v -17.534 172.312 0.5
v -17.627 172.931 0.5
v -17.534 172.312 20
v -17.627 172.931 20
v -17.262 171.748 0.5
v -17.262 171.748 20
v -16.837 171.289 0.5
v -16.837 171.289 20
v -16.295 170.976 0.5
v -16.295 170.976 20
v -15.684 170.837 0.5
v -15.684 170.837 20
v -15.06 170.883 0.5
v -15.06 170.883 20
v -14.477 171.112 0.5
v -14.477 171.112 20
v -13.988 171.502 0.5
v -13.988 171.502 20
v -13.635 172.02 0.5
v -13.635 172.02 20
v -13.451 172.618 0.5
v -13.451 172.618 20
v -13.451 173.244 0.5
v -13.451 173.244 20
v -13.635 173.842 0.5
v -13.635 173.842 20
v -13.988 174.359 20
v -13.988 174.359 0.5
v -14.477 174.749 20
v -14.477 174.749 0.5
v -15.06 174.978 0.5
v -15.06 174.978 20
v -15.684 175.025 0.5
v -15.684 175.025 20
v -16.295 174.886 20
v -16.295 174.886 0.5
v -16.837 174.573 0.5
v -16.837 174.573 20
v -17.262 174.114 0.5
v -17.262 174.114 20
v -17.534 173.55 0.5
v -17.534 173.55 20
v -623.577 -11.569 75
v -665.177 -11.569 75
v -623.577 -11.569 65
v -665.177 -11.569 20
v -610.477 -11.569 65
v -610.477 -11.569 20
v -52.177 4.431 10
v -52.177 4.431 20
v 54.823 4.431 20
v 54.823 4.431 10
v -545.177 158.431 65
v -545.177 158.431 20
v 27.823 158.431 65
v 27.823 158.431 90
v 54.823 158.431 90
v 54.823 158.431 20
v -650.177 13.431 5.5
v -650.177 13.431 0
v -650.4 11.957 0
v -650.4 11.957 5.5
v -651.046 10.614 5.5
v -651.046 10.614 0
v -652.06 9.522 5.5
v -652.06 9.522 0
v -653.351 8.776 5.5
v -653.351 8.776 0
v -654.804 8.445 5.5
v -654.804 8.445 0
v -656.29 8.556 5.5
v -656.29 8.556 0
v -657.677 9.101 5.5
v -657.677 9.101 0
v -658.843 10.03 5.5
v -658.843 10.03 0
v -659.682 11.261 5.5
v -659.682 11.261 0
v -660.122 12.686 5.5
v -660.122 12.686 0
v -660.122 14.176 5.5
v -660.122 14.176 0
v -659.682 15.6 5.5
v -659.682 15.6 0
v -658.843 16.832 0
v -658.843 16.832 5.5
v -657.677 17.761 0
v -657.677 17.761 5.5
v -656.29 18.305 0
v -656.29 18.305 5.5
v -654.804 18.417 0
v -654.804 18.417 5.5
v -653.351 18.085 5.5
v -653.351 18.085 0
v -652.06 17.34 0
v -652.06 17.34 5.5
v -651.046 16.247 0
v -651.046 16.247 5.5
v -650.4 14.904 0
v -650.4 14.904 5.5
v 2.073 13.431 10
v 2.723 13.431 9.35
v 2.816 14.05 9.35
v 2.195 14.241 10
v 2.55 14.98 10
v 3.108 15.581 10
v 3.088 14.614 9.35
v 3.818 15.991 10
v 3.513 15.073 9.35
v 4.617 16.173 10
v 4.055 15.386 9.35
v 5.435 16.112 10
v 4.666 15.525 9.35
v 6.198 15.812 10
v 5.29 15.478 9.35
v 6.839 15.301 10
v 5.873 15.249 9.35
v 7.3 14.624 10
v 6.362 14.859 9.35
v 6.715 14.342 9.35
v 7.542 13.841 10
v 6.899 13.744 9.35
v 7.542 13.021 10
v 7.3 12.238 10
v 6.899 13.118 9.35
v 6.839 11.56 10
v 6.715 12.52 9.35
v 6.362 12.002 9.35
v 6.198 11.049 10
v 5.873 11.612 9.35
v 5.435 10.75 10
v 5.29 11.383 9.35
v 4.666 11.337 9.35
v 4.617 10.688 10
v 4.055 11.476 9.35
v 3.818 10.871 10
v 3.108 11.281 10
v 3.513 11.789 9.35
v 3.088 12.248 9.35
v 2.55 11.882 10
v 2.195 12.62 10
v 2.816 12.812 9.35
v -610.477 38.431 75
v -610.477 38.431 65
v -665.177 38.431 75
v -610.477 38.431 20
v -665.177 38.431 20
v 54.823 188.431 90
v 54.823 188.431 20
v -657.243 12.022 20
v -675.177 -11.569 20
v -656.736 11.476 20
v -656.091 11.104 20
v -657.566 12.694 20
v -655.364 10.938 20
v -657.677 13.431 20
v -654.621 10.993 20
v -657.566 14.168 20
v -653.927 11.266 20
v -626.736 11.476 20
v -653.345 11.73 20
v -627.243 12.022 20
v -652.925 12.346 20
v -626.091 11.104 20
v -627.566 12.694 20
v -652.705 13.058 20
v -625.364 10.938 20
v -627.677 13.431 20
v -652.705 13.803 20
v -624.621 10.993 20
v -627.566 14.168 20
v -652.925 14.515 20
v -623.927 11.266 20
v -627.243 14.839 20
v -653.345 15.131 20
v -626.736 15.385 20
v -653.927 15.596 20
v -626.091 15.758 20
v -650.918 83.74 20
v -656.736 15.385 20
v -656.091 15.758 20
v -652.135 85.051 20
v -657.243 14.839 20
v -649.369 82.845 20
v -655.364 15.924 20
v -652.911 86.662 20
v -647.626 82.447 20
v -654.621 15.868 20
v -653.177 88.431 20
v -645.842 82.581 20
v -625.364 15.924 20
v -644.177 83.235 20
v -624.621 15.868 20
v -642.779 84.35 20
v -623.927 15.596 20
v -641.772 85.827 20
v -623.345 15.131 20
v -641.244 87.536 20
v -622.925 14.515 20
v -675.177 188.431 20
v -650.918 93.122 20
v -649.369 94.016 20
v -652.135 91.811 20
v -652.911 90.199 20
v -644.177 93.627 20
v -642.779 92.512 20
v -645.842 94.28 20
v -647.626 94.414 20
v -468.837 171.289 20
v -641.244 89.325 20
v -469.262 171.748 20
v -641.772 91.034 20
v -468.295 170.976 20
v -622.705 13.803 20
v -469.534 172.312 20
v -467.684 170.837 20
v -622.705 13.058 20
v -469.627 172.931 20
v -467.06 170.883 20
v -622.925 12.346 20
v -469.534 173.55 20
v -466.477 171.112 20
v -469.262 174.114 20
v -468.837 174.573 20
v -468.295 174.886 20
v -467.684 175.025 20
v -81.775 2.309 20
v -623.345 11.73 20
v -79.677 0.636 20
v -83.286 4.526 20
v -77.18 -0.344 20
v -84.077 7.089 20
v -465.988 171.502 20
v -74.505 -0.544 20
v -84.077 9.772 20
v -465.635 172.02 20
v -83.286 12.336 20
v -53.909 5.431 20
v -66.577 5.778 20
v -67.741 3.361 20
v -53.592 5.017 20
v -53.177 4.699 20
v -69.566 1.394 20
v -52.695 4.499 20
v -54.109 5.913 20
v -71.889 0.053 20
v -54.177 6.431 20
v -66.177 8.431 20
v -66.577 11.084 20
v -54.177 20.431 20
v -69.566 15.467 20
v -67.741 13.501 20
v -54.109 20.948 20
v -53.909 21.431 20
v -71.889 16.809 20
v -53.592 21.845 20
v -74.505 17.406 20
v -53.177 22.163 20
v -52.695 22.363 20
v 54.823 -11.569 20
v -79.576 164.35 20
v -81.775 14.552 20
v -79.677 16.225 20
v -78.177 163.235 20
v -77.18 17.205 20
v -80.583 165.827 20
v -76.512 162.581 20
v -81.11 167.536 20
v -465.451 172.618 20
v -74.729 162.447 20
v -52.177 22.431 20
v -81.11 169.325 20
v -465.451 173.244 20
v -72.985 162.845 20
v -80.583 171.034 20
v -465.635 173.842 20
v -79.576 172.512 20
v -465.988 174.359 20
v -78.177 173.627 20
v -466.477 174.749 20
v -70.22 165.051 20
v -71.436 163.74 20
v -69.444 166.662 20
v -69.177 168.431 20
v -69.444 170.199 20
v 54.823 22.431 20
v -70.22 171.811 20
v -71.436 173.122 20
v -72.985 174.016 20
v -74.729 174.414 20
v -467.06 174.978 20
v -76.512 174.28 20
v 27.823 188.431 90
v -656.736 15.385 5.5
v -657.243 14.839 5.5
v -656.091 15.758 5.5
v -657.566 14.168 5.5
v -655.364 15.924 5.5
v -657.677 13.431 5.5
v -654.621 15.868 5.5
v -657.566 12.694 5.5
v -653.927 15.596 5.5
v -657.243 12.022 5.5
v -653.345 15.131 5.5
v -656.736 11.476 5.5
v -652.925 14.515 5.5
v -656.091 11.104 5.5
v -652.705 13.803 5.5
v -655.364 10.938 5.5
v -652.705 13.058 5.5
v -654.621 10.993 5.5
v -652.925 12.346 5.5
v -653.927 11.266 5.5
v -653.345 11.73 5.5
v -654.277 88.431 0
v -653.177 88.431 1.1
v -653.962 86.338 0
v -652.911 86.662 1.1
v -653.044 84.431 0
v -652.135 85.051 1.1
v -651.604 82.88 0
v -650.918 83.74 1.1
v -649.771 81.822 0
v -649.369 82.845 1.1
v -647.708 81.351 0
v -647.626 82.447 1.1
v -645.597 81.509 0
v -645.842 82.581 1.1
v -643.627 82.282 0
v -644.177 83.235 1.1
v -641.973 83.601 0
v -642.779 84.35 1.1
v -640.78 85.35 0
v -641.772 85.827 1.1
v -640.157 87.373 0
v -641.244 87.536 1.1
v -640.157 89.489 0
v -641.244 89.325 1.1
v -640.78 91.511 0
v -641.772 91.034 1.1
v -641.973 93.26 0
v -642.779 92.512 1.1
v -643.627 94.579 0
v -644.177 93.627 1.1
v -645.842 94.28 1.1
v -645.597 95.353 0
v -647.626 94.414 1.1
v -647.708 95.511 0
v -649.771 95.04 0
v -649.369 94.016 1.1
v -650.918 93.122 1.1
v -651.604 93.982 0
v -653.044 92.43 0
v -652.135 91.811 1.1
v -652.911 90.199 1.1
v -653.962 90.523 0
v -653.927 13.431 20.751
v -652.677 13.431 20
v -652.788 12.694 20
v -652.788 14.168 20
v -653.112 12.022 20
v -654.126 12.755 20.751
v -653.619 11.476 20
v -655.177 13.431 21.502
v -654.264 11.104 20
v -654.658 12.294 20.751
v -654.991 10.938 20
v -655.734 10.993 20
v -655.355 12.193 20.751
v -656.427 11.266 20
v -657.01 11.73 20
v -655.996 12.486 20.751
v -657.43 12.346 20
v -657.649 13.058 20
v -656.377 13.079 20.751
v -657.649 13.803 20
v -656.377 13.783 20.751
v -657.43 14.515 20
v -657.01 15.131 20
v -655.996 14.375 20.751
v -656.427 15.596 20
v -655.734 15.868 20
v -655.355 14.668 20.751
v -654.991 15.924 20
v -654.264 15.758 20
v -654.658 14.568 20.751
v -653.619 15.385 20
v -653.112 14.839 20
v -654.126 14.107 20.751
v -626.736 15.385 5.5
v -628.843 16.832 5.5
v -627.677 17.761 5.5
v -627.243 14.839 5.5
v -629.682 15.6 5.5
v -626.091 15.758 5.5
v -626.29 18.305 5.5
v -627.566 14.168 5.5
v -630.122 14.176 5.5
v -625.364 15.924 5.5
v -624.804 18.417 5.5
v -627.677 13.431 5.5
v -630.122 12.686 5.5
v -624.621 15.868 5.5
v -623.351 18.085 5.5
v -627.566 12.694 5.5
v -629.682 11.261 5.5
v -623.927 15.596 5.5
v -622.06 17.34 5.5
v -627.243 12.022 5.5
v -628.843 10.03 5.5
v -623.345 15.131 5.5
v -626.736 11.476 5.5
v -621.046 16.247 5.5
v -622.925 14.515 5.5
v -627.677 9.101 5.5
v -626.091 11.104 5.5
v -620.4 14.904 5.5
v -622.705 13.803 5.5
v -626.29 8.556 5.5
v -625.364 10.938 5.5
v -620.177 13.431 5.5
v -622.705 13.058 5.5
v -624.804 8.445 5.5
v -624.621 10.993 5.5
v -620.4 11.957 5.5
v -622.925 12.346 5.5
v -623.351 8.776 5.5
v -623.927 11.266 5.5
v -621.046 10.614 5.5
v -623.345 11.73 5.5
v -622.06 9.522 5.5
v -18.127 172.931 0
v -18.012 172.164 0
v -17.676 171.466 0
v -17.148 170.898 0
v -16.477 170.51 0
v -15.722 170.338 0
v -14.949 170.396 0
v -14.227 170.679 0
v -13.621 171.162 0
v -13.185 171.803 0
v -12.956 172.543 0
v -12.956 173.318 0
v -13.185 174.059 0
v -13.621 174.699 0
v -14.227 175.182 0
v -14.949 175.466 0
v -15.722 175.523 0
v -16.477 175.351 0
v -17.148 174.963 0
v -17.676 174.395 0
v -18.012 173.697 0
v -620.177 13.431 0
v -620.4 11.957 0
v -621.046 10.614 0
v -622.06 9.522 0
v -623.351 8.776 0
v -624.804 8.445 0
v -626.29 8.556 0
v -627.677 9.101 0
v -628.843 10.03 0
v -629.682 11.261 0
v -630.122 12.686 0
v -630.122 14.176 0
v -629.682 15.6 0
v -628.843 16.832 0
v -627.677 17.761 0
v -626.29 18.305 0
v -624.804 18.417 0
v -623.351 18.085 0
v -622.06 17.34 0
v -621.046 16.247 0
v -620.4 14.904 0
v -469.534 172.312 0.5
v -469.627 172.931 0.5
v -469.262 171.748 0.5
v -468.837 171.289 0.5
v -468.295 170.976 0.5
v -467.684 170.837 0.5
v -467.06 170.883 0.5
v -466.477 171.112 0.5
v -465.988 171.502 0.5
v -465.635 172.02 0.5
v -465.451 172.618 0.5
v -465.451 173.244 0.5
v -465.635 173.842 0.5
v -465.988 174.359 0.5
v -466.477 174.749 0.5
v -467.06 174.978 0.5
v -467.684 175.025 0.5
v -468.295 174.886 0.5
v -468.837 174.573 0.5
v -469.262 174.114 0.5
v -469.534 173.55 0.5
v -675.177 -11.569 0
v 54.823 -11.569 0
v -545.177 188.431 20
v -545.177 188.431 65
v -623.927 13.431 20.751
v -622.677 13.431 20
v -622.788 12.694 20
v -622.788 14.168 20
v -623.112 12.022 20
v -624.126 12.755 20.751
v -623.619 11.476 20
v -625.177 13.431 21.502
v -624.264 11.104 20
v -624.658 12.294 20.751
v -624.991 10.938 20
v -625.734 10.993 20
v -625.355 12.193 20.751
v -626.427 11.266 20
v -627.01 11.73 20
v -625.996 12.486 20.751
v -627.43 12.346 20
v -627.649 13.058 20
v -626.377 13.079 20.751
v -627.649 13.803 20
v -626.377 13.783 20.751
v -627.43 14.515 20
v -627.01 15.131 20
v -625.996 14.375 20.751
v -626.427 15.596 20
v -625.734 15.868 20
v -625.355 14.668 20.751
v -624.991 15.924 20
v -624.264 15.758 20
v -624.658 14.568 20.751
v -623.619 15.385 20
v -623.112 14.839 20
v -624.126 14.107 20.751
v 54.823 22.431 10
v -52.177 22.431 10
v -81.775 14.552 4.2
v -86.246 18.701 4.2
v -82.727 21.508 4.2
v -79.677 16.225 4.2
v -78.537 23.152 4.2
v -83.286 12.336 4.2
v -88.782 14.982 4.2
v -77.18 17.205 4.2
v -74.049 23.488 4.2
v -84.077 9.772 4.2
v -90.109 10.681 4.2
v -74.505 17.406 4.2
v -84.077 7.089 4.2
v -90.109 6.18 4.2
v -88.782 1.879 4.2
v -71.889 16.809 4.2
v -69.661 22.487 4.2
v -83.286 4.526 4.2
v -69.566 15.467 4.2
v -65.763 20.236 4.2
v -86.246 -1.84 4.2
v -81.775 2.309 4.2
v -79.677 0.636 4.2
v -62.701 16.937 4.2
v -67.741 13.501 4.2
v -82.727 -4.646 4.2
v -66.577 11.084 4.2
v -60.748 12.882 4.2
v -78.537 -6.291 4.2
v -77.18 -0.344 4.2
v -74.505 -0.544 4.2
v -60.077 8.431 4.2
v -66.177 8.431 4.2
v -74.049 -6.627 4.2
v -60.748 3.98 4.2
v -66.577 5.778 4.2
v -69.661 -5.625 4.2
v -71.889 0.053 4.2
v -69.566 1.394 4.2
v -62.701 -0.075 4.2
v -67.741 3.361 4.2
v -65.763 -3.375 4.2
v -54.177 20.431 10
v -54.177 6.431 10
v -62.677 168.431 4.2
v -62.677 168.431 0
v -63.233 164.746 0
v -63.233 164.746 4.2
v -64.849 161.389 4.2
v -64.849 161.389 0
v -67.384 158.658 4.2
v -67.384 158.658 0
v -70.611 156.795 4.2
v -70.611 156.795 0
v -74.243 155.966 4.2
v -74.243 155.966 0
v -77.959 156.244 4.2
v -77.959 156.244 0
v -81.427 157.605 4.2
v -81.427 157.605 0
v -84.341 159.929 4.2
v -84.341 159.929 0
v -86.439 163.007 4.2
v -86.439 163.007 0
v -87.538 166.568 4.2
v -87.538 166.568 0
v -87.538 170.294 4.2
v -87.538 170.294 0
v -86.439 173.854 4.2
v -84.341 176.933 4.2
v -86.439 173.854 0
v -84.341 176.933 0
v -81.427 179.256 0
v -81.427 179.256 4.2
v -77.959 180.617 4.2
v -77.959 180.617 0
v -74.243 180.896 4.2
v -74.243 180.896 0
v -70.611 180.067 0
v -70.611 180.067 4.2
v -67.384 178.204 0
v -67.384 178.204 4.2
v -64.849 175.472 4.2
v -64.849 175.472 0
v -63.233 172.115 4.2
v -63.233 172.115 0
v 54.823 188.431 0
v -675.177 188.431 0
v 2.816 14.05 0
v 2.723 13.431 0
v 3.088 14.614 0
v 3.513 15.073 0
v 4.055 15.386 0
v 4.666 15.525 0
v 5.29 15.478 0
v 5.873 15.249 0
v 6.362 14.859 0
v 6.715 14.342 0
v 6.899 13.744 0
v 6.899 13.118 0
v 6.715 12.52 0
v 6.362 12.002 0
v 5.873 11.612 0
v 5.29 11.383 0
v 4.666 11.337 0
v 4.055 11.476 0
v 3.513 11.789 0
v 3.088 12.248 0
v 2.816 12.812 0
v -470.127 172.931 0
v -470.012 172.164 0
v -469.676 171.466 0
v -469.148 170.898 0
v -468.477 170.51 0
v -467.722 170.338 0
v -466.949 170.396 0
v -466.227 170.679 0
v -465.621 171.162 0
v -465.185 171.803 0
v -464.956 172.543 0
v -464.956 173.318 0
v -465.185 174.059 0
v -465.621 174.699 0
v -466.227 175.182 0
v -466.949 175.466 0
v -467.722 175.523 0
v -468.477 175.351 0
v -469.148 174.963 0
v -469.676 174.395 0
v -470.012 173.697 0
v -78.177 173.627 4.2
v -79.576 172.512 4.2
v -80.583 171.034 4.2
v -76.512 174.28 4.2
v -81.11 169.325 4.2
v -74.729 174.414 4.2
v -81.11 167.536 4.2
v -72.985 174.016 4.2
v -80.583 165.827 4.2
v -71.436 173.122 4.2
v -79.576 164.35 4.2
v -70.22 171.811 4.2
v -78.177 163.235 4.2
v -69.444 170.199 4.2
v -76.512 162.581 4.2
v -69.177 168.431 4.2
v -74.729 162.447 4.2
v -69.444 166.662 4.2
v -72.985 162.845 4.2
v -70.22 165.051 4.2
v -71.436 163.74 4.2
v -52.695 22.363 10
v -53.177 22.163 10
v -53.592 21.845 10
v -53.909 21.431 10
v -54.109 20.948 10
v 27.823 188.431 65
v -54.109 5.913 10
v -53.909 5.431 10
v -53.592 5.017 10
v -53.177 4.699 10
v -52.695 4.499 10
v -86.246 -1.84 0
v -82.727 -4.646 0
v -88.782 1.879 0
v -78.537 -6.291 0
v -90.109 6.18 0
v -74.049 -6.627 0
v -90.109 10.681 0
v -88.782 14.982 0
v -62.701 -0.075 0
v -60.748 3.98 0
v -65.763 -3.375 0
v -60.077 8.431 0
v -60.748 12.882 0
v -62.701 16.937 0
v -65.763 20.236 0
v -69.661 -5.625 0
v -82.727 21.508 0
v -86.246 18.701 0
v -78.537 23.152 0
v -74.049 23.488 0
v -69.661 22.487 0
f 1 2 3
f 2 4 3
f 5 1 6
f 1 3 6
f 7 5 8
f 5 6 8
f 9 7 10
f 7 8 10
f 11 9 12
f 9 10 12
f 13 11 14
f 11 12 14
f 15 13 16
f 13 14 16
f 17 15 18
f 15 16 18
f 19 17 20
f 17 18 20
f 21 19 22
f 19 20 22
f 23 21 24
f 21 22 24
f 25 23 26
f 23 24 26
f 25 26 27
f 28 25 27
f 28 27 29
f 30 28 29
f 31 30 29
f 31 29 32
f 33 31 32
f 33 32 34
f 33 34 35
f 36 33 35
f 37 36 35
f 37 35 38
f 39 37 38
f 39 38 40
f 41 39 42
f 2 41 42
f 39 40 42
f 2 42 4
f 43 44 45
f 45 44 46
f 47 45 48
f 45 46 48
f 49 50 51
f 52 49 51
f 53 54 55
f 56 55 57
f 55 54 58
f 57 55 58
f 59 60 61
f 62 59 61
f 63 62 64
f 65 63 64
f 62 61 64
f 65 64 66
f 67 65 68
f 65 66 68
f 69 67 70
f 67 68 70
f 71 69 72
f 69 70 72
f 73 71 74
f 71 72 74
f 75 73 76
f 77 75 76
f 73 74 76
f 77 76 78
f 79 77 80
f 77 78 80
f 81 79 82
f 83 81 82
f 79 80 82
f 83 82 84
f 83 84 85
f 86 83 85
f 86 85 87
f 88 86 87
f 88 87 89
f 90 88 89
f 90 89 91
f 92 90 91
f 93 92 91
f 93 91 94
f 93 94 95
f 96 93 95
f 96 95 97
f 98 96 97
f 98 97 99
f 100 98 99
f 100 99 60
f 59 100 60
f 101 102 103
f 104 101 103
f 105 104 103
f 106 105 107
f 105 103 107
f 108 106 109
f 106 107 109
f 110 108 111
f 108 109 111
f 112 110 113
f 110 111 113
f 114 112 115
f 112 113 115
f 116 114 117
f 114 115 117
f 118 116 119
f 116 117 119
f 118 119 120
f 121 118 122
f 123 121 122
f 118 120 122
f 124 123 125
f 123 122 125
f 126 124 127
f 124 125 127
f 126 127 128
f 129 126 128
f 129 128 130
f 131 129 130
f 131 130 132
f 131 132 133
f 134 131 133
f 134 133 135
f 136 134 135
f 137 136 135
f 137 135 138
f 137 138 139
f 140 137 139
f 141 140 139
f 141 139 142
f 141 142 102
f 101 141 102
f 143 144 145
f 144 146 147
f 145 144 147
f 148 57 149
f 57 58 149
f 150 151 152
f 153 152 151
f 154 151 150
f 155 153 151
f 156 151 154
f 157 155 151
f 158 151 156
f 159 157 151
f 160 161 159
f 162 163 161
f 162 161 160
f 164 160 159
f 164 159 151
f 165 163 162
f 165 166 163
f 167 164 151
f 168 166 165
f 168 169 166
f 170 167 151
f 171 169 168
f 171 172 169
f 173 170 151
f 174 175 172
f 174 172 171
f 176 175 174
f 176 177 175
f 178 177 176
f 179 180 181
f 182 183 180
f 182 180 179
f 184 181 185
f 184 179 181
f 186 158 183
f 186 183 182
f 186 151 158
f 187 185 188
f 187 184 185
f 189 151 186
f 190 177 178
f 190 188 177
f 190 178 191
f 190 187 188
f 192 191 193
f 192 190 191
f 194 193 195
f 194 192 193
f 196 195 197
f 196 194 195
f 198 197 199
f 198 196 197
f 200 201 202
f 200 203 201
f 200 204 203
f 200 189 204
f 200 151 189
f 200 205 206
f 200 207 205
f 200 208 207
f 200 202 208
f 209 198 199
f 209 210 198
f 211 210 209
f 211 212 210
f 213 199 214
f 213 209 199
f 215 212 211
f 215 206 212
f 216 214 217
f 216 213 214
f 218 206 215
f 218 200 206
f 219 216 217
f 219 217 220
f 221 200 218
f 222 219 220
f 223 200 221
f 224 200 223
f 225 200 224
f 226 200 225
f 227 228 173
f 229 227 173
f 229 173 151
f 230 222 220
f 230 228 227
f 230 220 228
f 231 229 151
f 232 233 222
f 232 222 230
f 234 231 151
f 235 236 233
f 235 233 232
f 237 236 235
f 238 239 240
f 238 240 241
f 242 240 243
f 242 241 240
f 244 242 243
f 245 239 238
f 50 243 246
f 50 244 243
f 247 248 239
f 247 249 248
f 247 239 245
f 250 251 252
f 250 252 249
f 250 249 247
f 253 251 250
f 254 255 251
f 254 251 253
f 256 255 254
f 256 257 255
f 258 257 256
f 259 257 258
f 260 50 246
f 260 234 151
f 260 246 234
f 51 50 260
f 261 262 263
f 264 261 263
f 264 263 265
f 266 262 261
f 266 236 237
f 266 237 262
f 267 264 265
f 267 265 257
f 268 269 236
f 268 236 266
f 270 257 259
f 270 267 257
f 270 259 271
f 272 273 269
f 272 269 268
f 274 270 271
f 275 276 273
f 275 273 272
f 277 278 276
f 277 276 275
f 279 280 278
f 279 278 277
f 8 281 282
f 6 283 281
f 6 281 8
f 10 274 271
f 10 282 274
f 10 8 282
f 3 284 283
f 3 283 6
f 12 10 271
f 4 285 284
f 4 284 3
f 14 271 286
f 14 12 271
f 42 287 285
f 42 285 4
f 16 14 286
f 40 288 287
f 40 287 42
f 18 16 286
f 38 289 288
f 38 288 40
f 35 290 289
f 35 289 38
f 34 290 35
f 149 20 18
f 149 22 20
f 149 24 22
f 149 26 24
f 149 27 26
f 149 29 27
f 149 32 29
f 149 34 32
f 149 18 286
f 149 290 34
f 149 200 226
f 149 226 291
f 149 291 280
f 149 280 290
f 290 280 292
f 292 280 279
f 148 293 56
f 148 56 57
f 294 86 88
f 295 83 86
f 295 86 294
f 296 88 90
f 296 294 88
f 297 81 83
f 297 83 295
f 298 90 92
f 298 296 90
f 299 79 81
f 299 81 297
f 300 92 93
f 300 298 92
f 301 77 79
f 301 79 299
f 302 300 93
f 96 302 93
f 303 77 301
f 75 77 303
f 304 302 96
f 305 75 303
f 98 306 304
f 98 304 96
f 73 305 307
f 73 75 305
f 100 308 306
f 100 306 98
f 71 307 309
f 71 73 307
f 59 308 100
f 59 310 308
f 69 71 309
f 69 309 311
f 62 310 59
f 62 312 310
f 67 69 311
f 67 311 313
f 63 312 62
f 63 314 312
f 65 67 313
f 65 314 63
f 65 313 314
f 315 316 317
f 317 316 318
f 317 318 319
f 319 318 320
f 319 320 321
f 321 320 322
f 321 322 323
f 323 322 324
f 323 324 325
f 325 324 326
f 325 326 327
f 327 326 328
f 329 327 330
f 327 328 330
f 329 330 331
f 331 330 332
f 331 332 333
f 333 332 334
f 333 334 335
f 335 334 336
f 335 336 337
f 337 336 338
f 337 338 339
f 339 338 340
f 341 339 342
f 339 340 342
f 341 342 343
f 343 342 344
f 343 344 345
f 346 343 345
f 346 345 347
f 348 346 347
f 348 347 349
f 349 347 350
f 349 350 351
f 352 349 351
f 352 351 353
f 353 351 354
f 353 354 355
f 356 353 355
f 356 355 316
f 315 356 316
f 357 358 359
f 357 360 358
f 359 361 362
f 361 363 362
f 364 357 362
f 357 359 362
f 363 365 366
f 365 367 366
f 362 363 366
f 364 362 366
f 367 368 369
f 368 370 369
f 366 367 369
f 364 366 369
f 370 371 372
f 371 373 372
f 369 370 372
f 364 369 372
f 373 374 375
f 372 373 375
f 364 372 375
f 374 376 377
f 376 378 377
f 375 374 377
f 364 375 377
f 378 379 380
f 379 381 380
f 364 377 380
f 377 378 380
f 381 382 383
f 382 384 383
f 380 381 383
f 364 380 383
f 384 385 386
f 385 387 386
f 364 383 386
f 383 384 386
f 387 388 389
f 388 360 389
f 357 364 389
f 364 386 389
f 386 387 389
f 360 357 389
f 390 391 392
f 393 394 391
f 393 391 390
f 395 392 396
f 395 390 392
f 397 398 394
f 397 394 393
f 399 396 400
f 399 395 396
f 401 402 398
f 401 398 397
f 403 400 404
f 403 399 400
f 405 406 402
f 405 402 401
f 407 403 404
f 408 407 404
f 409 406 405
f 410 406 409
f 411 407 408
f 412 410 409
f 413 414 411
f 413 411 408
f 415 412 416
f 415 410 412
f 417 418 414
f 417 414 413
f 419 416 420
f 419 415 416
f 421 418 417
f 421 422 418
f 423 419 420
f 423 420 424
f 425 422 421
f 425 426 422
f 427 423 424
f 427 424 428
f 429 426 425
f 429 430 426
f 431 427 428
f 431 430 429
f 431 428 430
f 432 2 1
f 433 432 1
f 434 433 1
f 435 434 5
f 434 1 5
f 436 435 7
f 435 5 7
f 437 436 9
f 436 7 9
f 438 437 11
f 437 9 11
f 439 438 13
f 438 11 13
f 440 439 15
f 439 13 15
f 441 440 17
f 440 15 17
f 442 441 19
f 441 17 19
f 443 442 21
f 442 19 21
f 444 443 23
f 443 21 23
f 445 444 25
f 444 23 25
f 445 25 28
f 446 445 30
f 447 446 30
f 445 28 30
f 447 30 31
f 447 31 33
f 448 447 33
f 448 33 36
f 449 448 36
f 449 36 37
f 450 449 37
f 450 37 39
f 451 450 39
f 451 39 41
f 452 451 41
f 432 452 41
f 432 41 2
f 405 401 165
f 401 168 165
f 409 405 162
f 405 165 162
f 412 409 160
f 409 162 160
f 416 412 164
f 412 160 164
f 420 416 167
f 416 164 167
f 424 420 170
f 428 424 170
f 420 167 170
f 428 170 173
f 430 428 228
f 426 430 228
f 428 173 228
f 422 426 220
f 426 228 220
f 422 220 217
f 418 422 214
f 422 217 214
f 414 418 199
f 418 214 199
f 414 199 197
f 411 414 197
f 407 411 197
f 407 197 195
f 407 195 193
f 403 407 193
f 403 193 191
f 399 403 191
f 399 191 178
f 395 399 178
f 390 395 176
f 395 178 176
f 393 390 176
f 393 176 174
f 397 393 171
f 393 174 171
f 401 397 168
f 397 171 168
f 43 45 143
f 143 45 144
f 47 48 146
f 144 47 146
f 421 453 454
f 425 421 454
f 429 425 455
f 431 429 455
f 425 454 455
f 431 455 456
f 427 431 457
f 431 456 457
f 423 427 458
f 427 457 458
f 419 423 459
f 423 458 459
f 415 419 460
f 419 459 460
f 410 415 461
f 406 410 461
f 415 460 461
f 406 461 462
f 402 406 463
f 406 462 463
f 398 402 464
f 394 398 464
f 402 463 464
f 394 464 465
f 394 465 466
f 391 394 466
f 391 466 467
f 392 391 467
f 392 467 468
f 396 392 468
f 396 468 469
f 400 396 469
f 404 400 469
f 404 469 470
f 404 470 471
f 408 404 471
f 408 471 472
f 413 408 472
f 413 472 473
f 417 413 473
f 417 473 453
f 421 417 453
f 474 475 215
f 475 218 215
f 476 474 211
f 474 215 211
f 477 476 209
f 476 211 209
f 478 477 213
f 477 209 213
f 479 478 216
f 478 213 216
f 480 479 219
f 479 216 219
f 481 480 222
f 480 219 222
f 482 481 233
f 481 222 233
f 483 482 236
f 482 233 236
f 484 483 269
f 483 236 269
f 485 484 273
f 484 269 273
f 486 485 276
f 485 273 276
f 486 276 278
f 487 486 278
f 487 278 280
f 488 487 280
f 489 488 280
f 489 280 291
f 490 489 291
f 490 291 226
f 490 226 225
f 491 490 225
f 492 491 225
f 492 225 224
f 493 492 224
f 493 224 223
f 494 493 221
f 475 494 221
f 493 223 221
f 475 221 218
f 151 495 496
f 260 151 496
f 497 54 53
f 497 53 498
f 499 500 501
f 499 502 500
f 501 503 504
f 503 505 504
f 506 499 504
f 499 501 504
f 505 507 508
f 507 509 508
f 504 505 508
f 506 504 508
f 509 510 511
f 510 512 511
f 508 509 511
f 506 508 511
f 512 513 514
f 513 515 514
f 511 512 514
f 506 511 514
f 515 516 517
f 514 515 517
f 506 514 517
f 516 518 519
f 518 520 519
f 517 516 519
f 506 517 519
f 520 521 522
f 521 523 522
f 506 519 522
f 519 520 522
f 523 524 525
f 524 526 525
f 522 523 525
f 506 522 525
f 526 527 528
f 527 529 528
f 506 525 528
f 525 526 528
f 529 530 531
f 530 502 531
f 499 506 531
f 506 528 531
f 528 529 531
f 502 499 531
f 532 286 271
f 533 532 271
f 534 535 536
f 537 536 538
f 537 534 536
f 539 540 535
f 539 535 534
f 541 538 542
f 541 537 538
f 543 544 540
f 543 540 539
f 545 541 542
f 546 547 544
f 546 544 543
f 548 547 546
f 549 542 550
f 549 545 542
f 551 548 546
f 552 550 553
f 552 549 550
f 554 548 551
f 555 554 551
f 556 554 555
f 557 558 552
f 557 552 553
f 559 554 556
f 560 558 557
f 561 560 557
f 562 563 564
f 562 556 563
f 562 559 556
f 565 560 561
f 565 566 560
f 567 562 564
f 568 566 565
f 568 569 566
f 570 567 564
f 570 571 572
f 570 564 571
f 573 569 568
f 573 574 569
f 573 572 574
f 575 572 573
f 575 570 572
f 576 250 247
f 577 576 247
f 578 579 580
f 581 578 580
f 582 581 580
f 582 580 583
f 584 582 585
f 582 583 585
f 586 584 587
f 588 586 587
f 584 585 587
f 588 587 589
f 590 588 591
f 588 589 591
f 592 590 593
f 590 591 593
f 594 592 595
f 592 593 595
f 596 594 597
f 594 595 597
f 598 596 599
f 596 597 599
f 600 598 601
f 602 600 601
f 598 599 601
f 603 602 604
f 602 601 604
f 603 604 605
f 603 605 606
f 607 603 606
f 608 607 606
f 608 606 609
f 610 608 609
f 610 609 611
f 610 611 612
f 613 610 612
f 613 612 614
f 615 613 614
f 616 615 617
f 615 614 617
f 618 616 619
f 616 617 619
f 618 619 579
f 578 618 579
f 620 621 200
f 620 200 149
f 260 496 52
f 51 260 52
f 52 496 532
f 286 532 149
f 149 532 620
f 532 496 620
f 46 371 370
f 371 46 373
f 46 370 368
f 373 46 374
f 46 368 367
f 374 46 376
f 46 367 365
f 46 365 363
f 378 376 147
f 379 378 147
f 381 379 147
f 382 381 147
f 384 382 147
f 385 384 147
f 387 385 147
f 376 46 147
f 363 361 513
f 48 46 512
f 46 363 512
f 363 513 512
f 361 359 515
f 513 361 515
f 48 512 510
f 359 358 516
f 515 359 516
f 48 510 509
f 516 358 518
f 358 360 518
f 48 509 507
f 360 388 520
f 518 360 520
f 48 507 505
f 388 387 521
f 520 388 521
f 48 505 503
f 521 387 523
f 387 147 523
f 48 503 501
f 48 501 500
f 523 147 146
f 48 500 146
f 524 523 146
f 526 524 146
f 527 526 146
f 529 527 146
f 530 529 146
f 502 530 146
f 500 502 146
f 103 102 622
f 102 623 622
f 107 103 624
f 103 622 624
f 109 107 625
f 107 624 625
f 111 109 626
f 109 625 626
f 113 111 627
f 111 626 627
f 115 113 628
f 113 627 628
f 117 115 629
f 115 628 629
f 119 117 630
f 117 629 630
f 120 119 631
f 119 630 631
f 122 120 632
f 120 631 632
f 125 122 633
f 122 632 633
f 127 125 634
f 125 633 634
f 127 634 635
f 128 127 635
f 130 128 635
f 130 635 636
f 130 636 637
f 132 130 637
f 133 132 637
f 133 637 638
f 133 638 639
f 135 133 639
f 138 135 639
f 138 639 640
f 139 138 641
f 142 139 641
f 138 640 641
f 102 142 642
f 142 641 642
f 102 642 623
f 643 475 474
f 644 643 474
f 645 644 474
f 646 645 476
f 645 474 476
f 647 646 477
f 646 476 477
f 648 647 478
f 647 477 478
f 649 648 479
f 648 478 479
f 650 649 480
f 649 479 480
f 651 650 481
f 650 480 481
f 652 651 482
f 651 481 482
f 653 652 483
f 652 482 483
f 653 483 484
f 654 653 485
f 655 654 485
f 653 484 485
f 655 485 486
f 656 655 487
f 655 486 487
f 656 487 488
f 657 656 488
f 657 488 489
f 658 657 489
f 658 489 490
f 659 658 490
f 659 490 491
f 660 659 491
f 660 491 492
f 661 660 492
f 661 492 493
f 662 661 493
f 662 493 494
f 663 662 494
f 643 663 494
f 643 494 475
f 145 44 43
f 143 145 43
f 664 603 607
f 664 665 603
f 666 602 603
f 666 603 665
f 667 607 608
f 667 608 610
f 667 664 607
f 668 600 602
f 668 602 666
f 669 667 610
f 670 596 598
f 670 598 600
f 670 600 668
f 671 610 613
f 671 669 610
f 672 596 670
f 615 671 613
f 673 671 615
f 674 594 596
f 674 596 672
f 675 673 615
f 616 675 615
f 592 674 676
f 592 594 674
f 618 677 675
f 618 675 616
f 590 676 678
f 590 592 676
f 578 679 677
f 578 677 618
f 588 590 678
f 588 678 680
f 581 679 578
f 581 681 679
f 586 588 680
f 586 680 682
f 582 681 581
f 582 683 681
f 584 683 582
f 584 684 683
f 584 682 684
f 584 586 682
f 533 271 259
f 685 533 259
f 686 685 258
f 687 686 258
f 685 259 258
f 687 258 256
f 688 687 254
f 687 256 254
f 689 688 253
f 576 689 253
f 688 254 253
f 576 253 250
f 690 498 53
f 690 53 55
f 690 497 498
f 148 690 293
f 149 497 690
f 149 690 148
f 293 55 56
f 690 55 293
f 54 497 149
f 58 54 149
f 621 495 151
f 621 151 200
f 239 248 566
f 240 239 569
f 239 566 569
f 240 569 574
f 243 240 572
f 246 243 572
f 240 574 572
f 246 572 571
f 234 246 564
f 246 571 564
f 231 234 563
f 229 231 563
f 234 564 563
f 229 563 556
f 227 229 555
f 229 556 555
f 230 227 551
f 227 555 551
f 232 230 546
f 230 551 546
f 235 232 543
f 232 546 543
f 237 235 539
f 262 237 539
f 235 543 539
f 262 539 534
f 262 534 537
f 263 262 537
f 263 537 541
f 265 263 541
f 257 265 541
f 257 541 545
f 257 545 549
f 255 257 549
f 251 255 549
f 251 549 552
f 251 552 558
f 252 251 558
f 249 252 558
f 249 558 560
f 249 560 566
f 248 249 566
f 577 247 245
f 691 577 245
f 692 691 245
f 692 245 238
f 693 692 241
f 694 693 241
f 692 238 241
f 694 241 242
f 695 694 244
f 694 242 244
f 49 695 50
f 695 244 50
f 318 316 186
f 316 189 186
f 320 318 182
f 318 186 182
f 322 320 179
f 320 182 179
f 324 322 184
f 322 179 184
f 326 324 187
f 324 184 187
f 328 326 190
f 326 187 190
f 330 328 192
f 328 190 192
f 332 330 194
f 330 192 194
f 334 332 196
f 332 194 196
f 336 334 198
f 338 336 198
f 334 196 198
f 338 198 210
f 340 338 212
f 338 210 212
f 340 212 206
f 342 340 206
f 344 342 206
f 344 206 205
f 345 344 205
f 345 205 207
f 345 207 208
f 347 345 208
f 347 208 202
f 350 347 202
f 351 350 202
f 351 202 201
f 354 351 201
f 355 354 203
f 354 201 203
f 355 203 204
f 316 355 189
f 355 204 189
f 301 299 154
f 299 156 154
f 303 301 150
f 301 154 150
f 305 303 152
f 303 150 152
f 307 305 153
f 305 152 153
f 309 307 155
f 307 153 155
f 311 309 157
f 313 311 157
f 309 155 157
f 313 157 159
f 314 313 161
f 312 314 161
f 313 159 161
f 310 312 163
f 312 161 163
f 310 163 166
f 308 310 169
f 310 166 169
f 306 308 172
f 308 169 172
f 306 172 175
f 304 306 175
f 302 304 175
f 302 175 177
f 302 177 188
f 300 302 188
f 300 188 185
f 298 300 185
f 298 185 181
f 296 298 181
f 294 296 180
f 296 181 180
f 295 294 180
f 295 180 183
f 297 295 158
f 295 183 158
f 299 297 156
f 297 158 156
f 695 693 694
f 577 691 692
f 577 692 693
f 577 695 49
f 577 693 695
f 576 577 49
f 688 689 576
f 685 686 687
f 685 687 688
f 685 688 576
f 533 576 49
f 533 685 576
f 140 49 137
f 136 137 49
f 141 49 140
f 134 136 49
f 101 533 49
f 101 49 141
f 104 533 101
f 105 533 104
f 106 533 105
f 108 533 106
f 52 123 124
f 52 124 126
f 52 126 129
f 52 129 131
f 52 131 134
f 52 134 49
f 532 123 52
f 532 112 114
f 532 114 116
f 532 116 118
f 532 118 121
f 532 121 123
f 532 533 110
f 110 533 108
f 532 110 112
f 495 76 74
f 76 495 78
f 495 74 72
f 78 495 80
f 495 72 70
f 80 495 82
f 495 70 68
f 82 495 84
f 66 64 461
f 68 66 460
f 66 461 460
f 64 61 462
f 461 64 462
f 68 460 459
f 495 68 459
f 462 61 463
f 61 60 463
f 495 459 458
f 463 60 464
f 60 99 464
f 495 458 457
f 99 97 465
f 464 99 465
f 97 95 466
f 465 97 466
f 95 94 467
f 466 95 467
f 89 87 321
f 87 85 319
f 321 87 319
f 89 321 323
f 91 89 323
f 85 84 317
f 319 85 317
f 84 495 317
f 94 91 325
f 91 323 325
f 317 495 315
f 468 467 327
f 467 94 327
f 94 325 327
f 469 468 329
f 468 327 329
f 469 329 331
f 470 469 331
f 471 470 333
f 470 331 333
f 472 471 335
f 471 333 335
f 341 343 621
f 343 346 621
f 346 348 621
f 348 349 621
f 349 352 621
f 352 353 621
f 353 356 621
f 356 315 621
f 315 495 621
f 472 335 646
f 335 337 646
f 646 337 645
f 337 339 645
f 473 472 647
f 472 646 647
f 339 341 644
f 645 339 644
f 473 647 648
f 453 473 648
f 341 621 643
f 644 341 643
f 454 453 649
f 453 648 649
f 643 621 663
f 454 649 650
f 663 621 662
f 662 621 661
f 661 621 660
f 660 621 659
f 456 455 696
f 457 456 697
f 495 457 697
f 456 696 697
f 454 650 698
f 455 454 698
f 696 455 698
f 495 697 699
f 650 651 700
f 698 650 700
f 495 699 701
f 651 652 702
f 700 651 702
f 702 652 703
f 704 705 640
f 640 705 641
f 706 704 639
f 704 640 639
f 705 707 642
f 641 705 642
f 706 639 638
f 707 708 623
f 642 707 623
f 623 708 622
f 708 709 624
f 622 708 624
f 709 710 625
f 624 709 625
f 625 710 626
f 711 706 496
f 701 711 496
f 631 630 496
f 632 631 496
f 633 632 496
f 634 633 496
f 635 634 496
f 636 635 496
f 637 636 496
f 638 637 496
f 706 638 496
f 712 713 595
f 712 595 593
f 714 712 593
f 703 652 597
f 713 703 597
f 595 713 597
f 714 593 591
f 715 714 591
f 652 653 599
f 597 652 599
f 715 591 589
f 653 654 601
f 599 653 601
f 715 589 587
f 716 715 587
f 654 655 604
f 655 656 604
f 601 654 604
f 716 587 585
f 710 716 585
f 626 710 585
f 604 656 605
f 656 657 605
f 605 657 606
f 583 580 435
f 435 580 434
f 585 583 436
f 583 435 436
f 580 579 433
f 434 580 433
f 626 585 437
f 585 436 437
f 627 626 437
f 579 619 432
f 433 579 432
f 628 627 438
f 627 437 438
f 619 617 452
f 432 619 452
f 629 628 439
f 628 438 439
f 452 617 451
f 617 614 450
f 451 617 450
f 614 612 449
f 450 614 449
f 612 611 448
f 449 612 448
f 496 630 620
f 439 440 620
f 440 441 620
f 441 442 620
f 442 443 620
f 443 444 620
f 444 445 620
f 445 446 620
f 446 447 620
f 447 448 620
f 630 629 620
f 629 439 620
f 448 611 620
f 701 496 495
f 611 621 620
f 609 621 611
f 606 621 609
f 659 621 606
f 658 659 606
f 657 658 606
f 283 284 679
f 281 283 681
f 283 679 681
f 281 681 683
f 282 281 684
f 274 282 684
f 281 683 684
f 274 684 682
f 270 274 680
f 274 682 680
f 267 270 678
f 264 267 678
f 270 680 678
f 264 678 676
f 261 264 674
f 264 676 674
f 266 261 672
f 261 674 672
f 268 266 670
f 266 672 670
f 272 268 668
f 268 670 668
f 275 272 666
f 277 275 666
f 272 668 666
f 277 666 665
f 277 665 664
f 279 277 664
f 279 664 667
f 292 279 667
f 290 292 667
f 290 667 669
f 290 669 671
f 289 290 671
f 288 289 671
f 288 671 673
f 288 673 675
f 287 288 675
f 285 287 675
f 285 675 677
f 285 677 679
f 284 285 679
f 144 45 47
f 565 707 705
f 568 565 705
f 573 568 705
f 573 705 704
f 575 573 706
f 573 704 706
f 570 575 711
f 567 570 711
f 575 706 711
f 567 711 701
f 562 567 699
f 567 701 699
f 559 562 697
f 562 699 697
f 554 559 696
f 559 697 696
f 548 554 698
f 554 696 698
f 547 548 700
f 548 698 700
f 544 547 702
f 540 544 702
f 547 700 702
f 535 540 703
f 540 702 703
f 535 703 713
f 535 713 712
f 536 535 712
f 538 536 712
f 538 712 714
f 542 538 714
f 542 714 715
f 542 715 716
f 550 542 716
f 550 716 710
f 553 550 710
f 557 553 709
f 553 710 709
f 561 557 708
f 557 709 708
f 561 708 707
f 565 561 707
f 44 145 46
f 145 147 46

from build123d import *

# Parameters (mm, degrees)
F0_W              = 730
F0_H              = 200
F1_DEPTH          = 20
F2_W              = 600
F2_H              = 30
F3_DEPTH          = 45
F4_W              = 27
F4_H              = 30
F5_DEPTH          = 25
F6_W              = 54.7
F6_H              = 50
F7_DEPTH          = 45
F9_DEPTH          = 10
F11_DEPTH         = 10
F13_D             = 4.2
F13_CSINK_D       = 5.5
F13_CSINK_ANGLE   = 90
F15_D             = 4.2
F15_CSINK_D       = 5.2
F15_CSINK_ANGLE   = 90
F16_D             = 12
F16_CSINK_D       = 14.2
F16_CSINK_ANGLE   = 90
F17_D             = 5
F17_DEPTH         = 20
F17_CBORE_D       = 10
F17_CBORE_DEPTH   = 5.5
F17_TIP           = 1.5021515476
F17_2_D           = 5
F17_2_DEPTH       = 20
F17_2_CBORE_D     = 10
F17_2_CBORE_DEPTH = 5.5
F17_2_TIP         = 1.5021515476
F18_R             = 9
F18_R_2           = 6
F19_DEPTH         = 90.001
F20_R             = 15.1
F20_R_2           = 9
F20_R_3           = 12.5
F20_R_4           = 6
F21_DEPTH         = 4.2


with BuildPart() as f1:
    # F0 (on Top) → F1 (new body)
    with BuildSketch(Plane.XY):
        with Locations((-310.177372545, 88.43071796)):
            Rectangle(F0_W, F0_H)
    extrude(amount=F1_DEPTH)

    # F10 (on face) → F11 (cut)
    with BuildSketch(Plane.XY.offset(20)):
        with BuildLine():
            Line((54.822627455, 4.43071796), (54.822627455, 22.43071796))
            Line((54.822627455, 22.43071796), (-52.177372545, 22.43071796))
            ThreePointArc((-52.177372545, 22.43071796), (-53.5915861074, 21.8449315224), (-54.177372545, 20.43071796))
            Line((-54.177372545, 20.43071796), (-54.177372545, 6.43071796))
            ThreePointArc((-54.177372545, 6.43071796), (-53.5915861074, 5.0165043976), (-52.177372545, 4.43071796))
            Line((-52.177372545, 4.43071796), (54.822627455, 4.43071796))
        make_face()
    extrude(amount=-F11_DEPTH, mode=Mode.SUBTRACT)

    # F13 (through all)
    with Locations(Plane.XY.offset(10)):
        with Locations((4.822627455, 13.43071796)):
            CounterSinkHole(F13_D / 2, F13_CSINK_D / 2, counter_sink_angle=F13_CSINK_ANGLE)

    # F15 (through all)
    with Locations(Plane(origin=(0, 0, 0), x_dir=(1, 0, 0), z_dir=(0, 0, -1))):
        with Locations((-15.527372545, -172.93071796), (-467.527372545, -172.93071796)):
            CounterSinkHole(F15_D / 2, F15_CSINK_D / 2, counter_sink_angle=F15_CSINK_ANGLE)

    # F16 (through all)
    with Locations(Plane(origin=(0, 0, 0), x_dir=(1, 0, 0), z_dir=(0, 0, -1))):
        with Locations((-647.177372545, -88.43071796)):
            CounterSinkHole(F16_D / 2, F16_CSINK_D / 2, counter_sink_angle=F16_CSINK_ANGLE)

    # F17
    with Locations(Plane(origin=(0, 0, 0), x_dir=(1, 0, 0), z_dir=(0, 0, -1))):
        with Locations((-655.177372545, -13.43071796), (-625.177372545, -13.43071796)):
            CounterBoreHole(F17_D / 2, F17_CBORE_D / 2, F17_CBORE_DEPTH, depth=F17_DEPTH)
            with Locations((0, 0, -(F17_DEPTH + F17_TIP / 2))):  # 118° drill point
                Cone(0, F17_D / 2, F17_TIP, mode=Mode.SUBTRACT)

    # F18 (on face) → F19 (cut, through all)
    with BuildSketch(Plane(origin=(0, 0, 0), x_dir=(1, 0, 0), z_dir=(0, 0, -1))):
        with Locations((-75.177372545, -8.43071796)):
            Circle(F18_R)
        with Locations((-75.177372545, -168.43071796)):
            Circle(F18_R_2)
    extrude(amount=-F19_DEPTH, mode=Mode.SUBTRACT)

    # F20 (on face) → F21 (cut)
    with BuildSketch(Plane(origin=(0, 0, 0), x_dir=(1, 0, 0), z_dir=(0, 0, -1))):
        with Locations((-75.177372545, -8.43071796)):
            Circle(F20_R)
        with Locations((-75.177372545, -8.43071796)):
            Circle(F20_R_2, mode=Mode.SUBTRACT)
        with Locations((-75.177372545, -168.43071796)):
            Circle(F20_R_3)
        with Locations((-75.177372545, -168.43071796)):
            Circle(F20_R_4, mode=Mode.SUBTRACT)
    extrude(amount=-F21_DEPTH, mode=Mode.SUBTRACT)


with BuildPart() as f3:
    # F2 (on face) → F3 (new body)
    with BuildSketch(Plane.XY.offset(20)):
        with Locations((-245.177372545, 173.43071796)):
            Rectangle(F2_W, F2_H)
    extrude(amount=F3_DEPTH)

    # F4 (on face) → F5 (join)
    with BuildSketch(Plane.XY.offset(65)):
        with Locations((41.322627455, 173.43071796)):
            Rectangle(F4_W, F4_H)
    extrude(amount=F5_DEPTH)


with BuildPart() as f7:
    # F6 (on face) → F7 (new body)
    with BuildSketch(Plane.XY.offset(20)):
        with Locations((-637.827372545, 13.43071796)):
            Rectangle(F6_W, F6_H)
    extrude(amount=F7_DEPTH)

    # F8 (on face) → F9 (join)
    with BuildSketch(Plane.XY.offset(65)):
        Polygon((-610.477372545, 38.43071796), (-665.177372545, 38.43071796), (-665.177372545, -11.56928204), (-623.577372545, -11.56928204), align=None)
    extrude(amount=F9_DEPTH)

    # F17#2
    with Locations(Plane(origin=(0, 0, 0), x_dir=(1, 0, 0), z_dir=(0, 0, -1))):
        with Locations((-655.177372545, -13.43071796), (-625.177372545, -13.43071796)):
            CounterBoreHole(F17_2_D / 2, F17_2_CBORE_D / 2, F17_2_CBORE_DEPTH, depth=F17_2_DEPTH)
            with Locations((0, 0, -(F17_2_DEPTH + F17_2_TIP / 2))):  # 118° drill point
                Cone(0, F17_2_D / 2, F17_2_TIP, mode=Mode.SUBTRACT)


solid = Compound([f1.part, f3.part, f7.part])
